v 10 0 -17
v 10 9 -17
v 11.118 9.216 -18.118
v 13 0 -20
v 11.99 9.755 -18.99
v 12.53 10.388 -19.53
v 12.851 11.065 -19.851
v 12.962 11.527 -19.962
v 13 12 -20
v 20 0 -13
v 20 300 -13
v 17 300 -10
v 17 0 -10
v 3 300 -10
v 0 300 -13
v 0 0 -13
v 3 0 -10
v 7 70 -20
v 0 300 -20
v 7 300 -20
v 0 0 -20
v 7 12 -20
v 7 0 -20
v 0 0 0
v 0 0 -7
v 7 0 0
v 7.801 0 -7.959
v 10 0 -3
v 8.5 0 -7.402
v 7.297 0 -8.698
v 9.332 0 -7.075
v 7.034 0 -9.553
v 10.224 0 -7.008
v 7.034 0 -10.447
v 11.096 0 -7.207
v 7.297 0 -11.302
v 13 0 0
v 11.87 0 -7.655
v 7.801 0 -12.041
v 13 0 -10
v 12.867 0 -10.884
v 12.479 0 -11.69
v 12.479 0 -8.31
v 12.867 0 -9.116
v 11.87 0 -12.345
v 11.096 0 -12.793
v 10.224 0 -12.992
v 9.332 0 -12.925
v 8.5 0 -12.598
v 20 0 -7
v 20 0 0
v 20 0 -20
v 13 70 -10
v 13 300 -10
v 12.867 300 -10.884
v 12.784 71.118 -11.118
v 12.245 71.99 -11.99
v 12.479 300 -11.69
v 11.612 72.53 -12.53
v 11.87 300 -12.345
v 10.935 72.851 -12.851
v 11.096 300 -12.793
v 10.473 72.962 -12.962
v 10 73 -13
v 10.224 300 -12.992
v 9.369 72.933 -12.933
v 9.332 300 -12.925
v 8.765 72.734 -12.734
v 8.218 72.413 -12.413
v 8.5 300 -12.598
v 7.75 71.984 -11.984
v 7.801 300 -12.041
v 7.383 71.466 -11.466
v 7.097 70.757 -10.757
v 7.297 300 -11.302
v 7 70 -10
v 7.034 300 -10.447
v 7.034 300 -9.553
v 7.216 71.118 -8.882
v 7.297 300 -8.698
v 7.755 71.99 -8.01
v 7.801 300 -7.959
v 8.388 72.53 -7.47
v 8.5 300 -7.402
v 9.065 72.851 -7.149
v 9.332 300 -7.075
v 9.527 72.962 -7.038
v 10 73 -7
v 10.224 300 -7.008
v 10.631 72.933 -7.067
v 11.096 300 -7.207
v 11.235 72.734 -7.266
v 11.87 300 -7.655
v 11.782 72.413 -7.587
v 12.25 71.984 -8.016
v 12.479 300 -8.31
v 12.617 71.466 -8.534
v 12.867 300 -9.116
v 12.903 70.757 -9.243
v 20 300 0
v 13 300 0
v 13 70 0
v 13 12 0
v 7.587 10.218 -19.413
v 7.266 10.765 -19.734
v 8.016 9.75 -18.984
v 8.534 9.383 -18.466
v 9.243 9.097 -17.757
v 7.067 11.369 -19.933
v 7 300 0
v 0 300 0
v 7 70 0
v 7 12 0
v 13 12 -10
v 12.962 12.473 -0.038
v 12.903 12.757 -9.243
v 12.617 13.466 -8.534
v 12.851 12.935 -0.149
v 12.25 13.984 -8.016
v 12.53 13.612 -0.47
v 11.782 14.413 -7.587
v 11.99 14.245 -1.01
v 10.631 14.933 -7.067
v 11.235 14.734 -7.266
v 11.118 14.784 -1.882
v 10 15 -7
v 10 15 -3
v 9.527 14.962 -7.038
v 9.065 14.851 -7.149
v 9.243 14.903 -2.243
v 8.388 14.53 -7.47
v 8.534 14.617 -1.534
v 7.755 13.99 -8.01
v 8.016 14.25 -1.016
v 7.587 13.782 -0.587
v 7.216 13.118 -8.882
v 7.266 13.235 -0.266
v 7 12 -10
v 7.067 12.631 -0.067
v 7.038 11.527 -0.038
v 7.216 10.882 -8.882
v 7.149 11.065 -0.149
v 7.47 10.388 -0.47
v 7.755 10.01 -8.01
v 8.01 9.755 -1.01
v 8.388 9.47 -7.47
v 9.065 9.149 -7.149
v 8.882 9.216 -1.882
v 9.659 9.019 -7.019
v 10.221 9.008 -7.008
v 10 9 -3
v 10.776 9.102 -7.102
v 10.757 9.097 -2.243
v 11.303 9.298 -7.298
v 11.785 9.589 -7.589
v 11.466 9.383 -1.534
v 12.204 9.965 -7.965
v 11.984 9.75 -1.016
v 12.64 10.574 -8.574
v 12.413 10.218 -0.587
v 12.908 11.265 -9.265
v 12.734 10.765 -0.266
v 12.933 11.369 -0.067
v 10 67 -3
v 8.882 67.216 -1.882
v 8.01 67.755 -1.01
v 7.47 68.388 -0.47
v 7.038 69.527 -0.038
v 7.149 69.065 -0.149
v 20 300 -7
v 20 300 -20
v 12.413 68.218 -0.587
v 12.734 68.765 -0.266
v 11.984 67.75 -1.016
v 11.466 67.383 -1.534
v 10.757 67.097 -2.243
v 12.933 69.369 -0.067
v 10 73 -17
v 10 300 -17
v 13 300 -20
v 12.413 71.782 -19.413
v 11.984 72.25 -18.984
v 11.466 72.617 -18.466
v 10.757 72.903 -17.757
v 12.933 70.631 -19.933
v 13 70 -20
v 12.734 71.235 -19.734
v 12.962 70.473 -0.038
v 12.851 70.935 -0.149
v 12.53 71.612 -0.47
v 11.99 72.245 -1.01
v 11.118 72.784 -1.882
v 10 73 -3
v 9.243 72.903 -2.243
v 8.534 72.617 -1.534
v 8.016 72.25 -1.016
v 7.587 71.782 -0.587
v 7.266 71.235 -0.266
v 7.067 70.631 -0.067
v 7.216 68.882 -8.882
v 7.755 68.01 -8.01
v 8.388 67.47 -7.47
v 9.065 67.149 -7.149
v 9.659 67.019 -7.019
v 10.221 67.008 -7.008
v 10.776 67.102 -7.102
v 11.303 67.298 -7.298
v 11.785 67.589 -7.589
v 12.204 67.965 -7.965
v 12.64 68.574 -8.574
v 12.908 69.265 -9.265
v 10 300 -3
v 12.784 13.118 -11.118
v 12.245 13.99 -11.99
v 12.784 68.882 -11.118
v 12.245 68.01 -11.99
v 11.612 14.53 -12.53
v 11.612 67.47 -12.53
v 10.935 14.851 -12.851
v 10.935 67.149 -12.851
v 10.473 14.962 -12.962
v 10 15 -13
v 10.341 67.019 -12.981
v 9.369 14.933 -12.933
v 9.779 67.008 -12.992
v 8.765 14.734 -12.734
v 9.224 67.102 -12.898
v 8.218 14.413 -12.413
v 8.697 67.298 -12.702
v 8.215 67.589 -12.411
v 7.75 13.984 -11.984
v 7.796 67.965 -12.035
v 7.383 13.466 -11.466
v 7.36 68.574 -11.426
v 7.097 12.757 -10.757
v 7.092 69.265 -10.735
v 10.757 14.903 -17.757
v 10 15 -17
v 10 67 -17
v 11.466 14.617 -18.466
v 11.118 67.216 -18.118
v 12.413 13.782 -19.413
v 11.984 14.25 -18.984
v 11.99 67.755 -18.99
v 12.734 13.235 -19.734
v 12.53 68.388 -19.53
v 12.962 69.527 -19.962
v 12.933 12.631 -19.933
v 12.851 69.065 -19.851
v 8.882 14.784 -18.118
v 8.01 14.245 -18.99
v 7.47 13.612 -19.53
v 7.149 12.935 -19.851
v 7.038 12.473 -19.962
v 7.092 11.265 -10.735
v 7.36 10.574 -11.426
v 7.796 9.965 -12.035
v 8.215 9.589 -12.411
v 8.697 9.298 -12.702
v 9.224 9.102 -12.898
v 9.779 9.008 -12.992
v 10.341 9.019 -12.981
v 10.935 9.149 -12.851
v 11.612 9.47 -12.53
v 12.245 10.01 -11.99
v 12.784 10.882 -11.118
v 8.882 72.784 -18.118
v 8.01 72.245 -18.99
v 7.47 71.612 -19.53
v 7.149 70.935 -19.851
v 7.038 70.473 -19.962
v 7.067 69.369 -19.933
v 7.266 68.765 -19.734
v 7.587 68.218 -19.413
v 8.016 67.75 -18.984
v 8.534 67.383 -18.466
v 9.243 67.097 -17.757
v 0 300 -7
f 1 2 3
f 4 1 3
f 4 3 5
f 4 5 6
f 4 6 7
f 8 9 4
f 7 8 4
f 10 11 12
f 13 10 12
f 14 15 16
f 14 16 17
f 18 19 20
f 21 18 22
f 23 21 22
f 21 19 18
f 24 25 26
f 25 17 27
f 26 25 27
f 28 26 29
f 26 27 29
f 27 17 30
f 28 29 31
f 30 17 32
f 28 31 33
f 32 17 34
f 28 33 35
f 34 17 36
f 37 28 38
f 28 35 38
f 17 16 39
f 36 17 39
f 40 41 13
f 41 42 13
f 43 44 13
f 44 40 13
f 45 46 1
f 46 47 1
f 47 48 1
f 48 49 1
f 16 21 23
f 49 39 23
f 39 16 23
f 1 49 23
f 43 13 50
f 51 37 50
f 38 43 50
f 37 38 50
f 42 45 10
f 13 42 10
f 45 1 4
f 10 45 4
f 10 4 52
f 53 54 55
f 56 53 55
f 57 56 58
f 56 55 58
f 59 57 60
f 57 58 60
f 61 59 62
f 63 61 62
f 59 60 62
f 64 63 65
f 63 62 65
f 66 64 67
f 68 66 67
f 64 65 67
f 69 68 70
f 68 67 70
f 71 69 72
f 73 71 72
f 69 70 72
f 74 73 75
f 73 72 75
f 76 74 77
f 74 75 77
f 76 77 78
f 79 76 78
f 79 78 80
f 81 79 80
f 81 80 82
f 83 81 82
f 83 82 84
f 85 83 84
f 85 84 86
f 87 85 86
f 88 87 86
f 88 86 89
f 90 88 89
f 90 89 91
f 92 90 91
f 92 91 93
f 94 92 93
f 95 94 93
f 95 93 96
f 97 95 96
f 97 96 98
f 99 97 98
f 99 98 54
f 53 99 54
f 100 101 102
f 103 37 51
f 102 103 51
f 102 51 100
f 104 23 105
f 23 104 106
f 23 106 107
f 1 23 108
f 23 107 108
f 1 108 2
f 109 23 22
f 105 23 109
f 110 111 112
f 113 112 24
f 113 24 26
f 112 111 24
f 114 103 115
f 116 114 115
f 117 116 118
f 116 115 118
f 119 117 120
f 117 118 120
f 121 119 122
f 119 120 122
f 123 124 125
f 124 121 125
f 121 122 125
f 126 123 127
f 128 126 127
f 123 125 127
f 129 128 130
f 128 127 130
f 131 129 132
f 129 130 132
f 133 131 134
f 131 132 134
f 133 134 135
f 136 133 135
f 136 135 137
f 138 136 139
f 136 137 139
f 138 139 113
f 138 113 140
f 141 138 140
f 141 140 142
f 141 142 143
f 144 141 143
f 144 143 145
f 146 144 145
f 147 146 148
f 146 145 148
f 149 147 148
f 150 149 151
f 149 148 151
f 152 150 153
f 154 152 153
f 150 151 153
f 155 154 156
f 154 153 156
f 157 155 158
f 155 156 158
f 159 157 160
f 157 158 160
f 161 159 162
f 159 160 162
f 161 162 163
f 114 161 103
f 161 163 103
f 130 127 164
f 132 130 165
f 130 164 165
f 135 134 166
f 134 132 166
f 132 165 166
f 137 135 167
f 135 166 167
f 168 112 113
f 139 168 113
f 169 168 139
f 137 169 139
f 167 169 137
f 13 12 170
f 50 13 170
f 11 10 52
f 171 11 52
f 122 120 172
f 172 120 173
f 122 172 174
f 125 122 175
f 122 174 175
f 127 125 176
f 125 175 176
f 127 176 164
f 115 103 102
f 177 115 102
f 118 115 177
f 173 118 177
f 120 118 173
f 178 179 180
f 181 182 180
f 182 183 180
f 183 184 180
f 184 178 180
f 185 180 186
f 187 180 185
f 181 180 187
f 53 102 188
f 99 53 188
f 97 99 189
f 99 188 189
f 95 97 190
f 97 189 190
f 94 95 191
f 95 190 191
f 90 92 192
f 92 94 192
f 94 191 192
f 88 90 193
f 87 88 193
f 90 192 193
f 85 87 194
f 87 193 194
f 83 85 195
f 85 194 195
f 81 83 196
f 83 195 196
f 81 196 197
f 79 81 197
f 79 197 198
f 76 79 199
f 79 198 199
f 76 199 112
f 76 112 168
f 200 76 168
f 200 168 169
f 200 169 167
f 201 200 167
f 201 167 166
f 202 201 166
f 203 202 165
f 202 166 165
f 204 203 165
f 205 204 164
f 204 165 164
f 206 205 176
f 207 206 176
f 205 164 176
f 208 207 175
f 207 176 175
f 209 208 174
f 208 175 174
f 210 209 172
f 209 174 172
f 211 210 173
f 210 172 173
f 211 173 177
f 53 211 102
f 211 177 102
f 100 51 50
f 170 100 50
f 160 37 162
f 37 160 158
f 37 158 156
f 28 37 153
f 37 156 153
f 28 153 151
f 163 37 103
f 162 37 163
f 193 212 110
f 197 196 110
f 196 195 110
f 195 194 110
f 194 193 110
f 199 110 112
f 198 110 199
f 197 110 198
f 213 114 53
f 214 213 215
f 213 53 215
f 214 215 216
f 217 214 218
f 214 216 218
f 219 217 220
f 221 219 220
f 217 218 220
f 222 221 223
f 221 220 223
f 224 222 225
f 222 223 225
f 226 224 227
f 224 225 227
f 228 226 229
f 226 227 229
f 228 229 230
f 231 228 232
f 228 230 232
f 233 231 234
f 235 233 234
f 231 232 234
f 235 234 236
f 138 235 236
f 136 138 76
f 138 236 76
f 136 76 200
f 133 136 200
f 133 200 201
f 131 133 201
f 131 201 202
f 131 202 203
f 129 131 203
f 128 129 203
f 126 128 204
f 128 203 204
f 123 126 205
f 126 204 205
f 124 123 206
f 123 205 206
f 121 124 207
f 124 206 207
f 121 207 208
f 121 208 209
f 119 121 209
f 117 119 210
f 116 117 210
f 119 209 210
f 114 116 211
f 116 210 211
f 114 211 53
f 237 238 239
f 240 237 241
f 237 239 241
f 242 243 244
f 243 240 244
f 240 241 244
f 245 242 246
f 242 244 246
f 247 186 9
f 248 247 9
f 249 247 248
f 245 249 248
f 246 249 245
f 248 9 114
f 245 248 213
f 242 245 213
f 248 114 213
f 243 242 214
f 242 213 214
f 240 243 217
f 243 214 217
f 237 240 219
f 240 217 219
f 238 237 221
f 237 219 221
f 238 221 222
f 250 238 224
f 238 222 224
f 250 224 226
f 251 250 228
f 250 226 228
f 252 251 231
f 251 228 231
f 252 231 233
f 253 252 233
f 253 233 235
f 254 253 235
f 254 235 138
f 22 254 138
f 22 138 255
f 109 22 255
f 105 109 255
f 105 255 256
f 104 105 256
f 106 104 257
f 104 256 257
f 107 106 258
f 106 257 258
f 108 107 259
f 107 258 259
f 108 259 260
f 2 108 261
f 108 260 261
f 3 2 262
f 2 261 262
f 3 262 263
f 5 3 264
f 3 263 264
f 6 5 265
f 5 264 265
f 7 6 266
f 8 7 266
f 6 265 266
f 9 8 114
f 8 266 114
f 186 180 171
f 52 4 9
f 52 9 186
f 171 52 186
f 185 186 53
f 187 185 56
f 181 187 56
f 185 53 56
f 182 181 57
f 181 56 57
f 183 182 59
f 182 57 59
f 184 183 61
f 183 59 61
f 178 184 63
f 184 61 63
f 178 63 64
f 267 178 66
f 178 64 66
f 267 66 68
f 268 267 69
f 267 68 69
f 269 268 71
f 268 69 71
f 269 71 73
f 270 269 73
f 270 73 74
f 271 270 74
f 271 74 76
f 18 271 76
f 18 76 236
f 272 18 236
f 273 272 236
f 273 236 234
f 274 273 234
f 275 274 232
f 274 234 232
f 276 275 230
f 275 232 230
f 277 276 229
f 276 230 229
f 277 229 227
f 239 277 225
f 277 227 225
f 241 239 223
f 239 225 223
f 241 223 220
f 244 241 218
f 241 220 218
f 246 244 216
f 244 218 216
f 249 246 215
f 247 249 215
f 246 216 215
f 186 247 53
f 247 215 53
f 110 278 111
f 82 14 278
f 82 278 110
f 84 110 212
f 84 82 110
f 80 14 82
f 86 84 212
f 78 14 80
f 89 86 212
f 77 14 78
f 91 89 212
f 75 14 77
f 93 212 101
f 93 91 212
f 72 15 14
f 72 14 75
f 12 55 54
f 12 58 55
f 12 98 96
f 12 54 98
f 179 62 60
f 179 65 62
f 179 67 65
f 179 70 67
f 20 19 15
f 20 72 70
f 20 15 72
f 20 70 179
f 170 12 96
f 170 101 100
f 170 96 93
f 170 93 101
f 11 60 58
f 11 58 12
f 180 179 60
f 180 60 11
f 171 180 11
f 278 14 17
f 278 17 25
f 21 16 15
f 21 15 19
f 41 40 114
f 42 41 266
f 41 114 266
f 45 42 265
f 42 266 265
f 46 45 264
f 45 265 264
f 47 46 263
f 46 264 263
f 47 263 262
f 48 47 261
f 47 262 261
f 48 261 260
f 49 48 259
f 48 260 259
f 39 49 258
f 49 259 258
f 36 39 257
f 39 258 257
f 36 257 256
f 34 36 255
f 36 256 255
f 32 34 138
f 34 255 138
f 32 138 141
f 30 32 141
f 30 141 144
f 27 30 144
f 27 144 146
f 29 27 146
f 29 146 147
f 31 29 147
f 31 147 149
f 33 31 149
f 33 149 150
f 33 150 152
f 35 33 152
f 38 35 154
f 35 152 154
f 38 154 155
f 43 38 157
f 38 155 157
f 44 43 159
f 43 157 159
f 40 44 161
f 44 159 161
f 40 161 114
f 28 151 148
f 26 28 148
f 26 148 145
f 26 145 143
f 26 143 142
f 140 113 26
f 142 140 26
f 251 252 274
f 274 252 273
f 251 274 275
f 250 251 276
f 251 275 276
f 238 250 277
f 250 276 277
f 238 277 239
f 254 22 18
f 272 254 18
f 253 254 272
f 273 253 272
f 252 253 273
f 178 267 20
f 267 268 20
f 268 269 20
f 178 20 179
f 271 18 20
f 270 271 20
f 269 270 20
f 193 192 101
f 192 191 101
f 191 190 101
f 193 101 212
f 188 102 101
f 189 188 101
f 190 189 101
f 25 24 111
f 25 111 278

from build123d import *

# Parameters (mm, degrees)
SKIZZE1_W                       = 20
SKIZZE1_H                       = 20
AUFSATZ_LINEAR_AUSTRAGEN1_DEPTH = 300
SCHNITT_LINEAR_AUSTRAGEN1_DEPTH = 301
SKIZZE3_R                       = 3
SCHNITT_LINEAR_AUSTRAGEN2_DEPTH = 301
SKETCH1_R                       = 3
CUT_EXTRUDE1_DEPTH              = 21


with BuildPart() as part:
    # Skizze1 → Aufsatz-Linear austragen1 (new body)
    with BuildSketch(Plane(origin=(0, 0, 0), x_dir=(1, 0, 0), z_dir=(0, 1, 0))):
        with Locations((10, 10)):
            Rectangle(SKIZZE1_W, SKIZZE1_H)
    extrude(amount=AUFSATZ_LINEAR_AUSTRAGEN1_DEPTH)

    # Skizze2 → Schnitt-Linear austragen1 (cut, through all)
    with BuildSketch(Plane(origin=(0, 300, 0), x_dir=(1, 0, 0), z_dir=(0, 1, 0))):
        Polygon((7, 20), (10, 17), (13, 20), align=None)
        Polygon((20, 13), (17, 10), (20, 7), align=None)
        Polygon((0, 7), (0, 13), (3, 10), align=None)
        Polygon((7, 0), (13, 0), (10, 3), align=None)
    extrude(amount=-SCHNITT_LINEAR_AUSTRAGEN1_DEPTH, mode=Mode.SUBTRACT)

    # Skizze3 → Schnitt-Linear austragen2 (cut, through all)
    with BuildSketch(Plane(origin=(0, 300, 0), x_dir=(1, 0, 0), z_dir=(0, 1, 0))):
        with Locations((10, 10)):
            Circle(SKIZZE3_R)
    extrude(amount=-SCHNITT_LINEAR_AUSTRAGEN2_DEPTH, mode=Mode.SUBTRACT)

    # Sketch1 → Cut-Extrude1 (cut, through all)
    with BuildSketch(Plane.XY):
        with Locations((10, 12)):
            Circle(SKETCH1_R)
        with Locations((10, 70)):
            Circle(SKETCH1_R)
    extrude(amount=-CUT_EXTRUDE1_DEPTH, mode=Mode.SUBTRACT)


solid = part.part
